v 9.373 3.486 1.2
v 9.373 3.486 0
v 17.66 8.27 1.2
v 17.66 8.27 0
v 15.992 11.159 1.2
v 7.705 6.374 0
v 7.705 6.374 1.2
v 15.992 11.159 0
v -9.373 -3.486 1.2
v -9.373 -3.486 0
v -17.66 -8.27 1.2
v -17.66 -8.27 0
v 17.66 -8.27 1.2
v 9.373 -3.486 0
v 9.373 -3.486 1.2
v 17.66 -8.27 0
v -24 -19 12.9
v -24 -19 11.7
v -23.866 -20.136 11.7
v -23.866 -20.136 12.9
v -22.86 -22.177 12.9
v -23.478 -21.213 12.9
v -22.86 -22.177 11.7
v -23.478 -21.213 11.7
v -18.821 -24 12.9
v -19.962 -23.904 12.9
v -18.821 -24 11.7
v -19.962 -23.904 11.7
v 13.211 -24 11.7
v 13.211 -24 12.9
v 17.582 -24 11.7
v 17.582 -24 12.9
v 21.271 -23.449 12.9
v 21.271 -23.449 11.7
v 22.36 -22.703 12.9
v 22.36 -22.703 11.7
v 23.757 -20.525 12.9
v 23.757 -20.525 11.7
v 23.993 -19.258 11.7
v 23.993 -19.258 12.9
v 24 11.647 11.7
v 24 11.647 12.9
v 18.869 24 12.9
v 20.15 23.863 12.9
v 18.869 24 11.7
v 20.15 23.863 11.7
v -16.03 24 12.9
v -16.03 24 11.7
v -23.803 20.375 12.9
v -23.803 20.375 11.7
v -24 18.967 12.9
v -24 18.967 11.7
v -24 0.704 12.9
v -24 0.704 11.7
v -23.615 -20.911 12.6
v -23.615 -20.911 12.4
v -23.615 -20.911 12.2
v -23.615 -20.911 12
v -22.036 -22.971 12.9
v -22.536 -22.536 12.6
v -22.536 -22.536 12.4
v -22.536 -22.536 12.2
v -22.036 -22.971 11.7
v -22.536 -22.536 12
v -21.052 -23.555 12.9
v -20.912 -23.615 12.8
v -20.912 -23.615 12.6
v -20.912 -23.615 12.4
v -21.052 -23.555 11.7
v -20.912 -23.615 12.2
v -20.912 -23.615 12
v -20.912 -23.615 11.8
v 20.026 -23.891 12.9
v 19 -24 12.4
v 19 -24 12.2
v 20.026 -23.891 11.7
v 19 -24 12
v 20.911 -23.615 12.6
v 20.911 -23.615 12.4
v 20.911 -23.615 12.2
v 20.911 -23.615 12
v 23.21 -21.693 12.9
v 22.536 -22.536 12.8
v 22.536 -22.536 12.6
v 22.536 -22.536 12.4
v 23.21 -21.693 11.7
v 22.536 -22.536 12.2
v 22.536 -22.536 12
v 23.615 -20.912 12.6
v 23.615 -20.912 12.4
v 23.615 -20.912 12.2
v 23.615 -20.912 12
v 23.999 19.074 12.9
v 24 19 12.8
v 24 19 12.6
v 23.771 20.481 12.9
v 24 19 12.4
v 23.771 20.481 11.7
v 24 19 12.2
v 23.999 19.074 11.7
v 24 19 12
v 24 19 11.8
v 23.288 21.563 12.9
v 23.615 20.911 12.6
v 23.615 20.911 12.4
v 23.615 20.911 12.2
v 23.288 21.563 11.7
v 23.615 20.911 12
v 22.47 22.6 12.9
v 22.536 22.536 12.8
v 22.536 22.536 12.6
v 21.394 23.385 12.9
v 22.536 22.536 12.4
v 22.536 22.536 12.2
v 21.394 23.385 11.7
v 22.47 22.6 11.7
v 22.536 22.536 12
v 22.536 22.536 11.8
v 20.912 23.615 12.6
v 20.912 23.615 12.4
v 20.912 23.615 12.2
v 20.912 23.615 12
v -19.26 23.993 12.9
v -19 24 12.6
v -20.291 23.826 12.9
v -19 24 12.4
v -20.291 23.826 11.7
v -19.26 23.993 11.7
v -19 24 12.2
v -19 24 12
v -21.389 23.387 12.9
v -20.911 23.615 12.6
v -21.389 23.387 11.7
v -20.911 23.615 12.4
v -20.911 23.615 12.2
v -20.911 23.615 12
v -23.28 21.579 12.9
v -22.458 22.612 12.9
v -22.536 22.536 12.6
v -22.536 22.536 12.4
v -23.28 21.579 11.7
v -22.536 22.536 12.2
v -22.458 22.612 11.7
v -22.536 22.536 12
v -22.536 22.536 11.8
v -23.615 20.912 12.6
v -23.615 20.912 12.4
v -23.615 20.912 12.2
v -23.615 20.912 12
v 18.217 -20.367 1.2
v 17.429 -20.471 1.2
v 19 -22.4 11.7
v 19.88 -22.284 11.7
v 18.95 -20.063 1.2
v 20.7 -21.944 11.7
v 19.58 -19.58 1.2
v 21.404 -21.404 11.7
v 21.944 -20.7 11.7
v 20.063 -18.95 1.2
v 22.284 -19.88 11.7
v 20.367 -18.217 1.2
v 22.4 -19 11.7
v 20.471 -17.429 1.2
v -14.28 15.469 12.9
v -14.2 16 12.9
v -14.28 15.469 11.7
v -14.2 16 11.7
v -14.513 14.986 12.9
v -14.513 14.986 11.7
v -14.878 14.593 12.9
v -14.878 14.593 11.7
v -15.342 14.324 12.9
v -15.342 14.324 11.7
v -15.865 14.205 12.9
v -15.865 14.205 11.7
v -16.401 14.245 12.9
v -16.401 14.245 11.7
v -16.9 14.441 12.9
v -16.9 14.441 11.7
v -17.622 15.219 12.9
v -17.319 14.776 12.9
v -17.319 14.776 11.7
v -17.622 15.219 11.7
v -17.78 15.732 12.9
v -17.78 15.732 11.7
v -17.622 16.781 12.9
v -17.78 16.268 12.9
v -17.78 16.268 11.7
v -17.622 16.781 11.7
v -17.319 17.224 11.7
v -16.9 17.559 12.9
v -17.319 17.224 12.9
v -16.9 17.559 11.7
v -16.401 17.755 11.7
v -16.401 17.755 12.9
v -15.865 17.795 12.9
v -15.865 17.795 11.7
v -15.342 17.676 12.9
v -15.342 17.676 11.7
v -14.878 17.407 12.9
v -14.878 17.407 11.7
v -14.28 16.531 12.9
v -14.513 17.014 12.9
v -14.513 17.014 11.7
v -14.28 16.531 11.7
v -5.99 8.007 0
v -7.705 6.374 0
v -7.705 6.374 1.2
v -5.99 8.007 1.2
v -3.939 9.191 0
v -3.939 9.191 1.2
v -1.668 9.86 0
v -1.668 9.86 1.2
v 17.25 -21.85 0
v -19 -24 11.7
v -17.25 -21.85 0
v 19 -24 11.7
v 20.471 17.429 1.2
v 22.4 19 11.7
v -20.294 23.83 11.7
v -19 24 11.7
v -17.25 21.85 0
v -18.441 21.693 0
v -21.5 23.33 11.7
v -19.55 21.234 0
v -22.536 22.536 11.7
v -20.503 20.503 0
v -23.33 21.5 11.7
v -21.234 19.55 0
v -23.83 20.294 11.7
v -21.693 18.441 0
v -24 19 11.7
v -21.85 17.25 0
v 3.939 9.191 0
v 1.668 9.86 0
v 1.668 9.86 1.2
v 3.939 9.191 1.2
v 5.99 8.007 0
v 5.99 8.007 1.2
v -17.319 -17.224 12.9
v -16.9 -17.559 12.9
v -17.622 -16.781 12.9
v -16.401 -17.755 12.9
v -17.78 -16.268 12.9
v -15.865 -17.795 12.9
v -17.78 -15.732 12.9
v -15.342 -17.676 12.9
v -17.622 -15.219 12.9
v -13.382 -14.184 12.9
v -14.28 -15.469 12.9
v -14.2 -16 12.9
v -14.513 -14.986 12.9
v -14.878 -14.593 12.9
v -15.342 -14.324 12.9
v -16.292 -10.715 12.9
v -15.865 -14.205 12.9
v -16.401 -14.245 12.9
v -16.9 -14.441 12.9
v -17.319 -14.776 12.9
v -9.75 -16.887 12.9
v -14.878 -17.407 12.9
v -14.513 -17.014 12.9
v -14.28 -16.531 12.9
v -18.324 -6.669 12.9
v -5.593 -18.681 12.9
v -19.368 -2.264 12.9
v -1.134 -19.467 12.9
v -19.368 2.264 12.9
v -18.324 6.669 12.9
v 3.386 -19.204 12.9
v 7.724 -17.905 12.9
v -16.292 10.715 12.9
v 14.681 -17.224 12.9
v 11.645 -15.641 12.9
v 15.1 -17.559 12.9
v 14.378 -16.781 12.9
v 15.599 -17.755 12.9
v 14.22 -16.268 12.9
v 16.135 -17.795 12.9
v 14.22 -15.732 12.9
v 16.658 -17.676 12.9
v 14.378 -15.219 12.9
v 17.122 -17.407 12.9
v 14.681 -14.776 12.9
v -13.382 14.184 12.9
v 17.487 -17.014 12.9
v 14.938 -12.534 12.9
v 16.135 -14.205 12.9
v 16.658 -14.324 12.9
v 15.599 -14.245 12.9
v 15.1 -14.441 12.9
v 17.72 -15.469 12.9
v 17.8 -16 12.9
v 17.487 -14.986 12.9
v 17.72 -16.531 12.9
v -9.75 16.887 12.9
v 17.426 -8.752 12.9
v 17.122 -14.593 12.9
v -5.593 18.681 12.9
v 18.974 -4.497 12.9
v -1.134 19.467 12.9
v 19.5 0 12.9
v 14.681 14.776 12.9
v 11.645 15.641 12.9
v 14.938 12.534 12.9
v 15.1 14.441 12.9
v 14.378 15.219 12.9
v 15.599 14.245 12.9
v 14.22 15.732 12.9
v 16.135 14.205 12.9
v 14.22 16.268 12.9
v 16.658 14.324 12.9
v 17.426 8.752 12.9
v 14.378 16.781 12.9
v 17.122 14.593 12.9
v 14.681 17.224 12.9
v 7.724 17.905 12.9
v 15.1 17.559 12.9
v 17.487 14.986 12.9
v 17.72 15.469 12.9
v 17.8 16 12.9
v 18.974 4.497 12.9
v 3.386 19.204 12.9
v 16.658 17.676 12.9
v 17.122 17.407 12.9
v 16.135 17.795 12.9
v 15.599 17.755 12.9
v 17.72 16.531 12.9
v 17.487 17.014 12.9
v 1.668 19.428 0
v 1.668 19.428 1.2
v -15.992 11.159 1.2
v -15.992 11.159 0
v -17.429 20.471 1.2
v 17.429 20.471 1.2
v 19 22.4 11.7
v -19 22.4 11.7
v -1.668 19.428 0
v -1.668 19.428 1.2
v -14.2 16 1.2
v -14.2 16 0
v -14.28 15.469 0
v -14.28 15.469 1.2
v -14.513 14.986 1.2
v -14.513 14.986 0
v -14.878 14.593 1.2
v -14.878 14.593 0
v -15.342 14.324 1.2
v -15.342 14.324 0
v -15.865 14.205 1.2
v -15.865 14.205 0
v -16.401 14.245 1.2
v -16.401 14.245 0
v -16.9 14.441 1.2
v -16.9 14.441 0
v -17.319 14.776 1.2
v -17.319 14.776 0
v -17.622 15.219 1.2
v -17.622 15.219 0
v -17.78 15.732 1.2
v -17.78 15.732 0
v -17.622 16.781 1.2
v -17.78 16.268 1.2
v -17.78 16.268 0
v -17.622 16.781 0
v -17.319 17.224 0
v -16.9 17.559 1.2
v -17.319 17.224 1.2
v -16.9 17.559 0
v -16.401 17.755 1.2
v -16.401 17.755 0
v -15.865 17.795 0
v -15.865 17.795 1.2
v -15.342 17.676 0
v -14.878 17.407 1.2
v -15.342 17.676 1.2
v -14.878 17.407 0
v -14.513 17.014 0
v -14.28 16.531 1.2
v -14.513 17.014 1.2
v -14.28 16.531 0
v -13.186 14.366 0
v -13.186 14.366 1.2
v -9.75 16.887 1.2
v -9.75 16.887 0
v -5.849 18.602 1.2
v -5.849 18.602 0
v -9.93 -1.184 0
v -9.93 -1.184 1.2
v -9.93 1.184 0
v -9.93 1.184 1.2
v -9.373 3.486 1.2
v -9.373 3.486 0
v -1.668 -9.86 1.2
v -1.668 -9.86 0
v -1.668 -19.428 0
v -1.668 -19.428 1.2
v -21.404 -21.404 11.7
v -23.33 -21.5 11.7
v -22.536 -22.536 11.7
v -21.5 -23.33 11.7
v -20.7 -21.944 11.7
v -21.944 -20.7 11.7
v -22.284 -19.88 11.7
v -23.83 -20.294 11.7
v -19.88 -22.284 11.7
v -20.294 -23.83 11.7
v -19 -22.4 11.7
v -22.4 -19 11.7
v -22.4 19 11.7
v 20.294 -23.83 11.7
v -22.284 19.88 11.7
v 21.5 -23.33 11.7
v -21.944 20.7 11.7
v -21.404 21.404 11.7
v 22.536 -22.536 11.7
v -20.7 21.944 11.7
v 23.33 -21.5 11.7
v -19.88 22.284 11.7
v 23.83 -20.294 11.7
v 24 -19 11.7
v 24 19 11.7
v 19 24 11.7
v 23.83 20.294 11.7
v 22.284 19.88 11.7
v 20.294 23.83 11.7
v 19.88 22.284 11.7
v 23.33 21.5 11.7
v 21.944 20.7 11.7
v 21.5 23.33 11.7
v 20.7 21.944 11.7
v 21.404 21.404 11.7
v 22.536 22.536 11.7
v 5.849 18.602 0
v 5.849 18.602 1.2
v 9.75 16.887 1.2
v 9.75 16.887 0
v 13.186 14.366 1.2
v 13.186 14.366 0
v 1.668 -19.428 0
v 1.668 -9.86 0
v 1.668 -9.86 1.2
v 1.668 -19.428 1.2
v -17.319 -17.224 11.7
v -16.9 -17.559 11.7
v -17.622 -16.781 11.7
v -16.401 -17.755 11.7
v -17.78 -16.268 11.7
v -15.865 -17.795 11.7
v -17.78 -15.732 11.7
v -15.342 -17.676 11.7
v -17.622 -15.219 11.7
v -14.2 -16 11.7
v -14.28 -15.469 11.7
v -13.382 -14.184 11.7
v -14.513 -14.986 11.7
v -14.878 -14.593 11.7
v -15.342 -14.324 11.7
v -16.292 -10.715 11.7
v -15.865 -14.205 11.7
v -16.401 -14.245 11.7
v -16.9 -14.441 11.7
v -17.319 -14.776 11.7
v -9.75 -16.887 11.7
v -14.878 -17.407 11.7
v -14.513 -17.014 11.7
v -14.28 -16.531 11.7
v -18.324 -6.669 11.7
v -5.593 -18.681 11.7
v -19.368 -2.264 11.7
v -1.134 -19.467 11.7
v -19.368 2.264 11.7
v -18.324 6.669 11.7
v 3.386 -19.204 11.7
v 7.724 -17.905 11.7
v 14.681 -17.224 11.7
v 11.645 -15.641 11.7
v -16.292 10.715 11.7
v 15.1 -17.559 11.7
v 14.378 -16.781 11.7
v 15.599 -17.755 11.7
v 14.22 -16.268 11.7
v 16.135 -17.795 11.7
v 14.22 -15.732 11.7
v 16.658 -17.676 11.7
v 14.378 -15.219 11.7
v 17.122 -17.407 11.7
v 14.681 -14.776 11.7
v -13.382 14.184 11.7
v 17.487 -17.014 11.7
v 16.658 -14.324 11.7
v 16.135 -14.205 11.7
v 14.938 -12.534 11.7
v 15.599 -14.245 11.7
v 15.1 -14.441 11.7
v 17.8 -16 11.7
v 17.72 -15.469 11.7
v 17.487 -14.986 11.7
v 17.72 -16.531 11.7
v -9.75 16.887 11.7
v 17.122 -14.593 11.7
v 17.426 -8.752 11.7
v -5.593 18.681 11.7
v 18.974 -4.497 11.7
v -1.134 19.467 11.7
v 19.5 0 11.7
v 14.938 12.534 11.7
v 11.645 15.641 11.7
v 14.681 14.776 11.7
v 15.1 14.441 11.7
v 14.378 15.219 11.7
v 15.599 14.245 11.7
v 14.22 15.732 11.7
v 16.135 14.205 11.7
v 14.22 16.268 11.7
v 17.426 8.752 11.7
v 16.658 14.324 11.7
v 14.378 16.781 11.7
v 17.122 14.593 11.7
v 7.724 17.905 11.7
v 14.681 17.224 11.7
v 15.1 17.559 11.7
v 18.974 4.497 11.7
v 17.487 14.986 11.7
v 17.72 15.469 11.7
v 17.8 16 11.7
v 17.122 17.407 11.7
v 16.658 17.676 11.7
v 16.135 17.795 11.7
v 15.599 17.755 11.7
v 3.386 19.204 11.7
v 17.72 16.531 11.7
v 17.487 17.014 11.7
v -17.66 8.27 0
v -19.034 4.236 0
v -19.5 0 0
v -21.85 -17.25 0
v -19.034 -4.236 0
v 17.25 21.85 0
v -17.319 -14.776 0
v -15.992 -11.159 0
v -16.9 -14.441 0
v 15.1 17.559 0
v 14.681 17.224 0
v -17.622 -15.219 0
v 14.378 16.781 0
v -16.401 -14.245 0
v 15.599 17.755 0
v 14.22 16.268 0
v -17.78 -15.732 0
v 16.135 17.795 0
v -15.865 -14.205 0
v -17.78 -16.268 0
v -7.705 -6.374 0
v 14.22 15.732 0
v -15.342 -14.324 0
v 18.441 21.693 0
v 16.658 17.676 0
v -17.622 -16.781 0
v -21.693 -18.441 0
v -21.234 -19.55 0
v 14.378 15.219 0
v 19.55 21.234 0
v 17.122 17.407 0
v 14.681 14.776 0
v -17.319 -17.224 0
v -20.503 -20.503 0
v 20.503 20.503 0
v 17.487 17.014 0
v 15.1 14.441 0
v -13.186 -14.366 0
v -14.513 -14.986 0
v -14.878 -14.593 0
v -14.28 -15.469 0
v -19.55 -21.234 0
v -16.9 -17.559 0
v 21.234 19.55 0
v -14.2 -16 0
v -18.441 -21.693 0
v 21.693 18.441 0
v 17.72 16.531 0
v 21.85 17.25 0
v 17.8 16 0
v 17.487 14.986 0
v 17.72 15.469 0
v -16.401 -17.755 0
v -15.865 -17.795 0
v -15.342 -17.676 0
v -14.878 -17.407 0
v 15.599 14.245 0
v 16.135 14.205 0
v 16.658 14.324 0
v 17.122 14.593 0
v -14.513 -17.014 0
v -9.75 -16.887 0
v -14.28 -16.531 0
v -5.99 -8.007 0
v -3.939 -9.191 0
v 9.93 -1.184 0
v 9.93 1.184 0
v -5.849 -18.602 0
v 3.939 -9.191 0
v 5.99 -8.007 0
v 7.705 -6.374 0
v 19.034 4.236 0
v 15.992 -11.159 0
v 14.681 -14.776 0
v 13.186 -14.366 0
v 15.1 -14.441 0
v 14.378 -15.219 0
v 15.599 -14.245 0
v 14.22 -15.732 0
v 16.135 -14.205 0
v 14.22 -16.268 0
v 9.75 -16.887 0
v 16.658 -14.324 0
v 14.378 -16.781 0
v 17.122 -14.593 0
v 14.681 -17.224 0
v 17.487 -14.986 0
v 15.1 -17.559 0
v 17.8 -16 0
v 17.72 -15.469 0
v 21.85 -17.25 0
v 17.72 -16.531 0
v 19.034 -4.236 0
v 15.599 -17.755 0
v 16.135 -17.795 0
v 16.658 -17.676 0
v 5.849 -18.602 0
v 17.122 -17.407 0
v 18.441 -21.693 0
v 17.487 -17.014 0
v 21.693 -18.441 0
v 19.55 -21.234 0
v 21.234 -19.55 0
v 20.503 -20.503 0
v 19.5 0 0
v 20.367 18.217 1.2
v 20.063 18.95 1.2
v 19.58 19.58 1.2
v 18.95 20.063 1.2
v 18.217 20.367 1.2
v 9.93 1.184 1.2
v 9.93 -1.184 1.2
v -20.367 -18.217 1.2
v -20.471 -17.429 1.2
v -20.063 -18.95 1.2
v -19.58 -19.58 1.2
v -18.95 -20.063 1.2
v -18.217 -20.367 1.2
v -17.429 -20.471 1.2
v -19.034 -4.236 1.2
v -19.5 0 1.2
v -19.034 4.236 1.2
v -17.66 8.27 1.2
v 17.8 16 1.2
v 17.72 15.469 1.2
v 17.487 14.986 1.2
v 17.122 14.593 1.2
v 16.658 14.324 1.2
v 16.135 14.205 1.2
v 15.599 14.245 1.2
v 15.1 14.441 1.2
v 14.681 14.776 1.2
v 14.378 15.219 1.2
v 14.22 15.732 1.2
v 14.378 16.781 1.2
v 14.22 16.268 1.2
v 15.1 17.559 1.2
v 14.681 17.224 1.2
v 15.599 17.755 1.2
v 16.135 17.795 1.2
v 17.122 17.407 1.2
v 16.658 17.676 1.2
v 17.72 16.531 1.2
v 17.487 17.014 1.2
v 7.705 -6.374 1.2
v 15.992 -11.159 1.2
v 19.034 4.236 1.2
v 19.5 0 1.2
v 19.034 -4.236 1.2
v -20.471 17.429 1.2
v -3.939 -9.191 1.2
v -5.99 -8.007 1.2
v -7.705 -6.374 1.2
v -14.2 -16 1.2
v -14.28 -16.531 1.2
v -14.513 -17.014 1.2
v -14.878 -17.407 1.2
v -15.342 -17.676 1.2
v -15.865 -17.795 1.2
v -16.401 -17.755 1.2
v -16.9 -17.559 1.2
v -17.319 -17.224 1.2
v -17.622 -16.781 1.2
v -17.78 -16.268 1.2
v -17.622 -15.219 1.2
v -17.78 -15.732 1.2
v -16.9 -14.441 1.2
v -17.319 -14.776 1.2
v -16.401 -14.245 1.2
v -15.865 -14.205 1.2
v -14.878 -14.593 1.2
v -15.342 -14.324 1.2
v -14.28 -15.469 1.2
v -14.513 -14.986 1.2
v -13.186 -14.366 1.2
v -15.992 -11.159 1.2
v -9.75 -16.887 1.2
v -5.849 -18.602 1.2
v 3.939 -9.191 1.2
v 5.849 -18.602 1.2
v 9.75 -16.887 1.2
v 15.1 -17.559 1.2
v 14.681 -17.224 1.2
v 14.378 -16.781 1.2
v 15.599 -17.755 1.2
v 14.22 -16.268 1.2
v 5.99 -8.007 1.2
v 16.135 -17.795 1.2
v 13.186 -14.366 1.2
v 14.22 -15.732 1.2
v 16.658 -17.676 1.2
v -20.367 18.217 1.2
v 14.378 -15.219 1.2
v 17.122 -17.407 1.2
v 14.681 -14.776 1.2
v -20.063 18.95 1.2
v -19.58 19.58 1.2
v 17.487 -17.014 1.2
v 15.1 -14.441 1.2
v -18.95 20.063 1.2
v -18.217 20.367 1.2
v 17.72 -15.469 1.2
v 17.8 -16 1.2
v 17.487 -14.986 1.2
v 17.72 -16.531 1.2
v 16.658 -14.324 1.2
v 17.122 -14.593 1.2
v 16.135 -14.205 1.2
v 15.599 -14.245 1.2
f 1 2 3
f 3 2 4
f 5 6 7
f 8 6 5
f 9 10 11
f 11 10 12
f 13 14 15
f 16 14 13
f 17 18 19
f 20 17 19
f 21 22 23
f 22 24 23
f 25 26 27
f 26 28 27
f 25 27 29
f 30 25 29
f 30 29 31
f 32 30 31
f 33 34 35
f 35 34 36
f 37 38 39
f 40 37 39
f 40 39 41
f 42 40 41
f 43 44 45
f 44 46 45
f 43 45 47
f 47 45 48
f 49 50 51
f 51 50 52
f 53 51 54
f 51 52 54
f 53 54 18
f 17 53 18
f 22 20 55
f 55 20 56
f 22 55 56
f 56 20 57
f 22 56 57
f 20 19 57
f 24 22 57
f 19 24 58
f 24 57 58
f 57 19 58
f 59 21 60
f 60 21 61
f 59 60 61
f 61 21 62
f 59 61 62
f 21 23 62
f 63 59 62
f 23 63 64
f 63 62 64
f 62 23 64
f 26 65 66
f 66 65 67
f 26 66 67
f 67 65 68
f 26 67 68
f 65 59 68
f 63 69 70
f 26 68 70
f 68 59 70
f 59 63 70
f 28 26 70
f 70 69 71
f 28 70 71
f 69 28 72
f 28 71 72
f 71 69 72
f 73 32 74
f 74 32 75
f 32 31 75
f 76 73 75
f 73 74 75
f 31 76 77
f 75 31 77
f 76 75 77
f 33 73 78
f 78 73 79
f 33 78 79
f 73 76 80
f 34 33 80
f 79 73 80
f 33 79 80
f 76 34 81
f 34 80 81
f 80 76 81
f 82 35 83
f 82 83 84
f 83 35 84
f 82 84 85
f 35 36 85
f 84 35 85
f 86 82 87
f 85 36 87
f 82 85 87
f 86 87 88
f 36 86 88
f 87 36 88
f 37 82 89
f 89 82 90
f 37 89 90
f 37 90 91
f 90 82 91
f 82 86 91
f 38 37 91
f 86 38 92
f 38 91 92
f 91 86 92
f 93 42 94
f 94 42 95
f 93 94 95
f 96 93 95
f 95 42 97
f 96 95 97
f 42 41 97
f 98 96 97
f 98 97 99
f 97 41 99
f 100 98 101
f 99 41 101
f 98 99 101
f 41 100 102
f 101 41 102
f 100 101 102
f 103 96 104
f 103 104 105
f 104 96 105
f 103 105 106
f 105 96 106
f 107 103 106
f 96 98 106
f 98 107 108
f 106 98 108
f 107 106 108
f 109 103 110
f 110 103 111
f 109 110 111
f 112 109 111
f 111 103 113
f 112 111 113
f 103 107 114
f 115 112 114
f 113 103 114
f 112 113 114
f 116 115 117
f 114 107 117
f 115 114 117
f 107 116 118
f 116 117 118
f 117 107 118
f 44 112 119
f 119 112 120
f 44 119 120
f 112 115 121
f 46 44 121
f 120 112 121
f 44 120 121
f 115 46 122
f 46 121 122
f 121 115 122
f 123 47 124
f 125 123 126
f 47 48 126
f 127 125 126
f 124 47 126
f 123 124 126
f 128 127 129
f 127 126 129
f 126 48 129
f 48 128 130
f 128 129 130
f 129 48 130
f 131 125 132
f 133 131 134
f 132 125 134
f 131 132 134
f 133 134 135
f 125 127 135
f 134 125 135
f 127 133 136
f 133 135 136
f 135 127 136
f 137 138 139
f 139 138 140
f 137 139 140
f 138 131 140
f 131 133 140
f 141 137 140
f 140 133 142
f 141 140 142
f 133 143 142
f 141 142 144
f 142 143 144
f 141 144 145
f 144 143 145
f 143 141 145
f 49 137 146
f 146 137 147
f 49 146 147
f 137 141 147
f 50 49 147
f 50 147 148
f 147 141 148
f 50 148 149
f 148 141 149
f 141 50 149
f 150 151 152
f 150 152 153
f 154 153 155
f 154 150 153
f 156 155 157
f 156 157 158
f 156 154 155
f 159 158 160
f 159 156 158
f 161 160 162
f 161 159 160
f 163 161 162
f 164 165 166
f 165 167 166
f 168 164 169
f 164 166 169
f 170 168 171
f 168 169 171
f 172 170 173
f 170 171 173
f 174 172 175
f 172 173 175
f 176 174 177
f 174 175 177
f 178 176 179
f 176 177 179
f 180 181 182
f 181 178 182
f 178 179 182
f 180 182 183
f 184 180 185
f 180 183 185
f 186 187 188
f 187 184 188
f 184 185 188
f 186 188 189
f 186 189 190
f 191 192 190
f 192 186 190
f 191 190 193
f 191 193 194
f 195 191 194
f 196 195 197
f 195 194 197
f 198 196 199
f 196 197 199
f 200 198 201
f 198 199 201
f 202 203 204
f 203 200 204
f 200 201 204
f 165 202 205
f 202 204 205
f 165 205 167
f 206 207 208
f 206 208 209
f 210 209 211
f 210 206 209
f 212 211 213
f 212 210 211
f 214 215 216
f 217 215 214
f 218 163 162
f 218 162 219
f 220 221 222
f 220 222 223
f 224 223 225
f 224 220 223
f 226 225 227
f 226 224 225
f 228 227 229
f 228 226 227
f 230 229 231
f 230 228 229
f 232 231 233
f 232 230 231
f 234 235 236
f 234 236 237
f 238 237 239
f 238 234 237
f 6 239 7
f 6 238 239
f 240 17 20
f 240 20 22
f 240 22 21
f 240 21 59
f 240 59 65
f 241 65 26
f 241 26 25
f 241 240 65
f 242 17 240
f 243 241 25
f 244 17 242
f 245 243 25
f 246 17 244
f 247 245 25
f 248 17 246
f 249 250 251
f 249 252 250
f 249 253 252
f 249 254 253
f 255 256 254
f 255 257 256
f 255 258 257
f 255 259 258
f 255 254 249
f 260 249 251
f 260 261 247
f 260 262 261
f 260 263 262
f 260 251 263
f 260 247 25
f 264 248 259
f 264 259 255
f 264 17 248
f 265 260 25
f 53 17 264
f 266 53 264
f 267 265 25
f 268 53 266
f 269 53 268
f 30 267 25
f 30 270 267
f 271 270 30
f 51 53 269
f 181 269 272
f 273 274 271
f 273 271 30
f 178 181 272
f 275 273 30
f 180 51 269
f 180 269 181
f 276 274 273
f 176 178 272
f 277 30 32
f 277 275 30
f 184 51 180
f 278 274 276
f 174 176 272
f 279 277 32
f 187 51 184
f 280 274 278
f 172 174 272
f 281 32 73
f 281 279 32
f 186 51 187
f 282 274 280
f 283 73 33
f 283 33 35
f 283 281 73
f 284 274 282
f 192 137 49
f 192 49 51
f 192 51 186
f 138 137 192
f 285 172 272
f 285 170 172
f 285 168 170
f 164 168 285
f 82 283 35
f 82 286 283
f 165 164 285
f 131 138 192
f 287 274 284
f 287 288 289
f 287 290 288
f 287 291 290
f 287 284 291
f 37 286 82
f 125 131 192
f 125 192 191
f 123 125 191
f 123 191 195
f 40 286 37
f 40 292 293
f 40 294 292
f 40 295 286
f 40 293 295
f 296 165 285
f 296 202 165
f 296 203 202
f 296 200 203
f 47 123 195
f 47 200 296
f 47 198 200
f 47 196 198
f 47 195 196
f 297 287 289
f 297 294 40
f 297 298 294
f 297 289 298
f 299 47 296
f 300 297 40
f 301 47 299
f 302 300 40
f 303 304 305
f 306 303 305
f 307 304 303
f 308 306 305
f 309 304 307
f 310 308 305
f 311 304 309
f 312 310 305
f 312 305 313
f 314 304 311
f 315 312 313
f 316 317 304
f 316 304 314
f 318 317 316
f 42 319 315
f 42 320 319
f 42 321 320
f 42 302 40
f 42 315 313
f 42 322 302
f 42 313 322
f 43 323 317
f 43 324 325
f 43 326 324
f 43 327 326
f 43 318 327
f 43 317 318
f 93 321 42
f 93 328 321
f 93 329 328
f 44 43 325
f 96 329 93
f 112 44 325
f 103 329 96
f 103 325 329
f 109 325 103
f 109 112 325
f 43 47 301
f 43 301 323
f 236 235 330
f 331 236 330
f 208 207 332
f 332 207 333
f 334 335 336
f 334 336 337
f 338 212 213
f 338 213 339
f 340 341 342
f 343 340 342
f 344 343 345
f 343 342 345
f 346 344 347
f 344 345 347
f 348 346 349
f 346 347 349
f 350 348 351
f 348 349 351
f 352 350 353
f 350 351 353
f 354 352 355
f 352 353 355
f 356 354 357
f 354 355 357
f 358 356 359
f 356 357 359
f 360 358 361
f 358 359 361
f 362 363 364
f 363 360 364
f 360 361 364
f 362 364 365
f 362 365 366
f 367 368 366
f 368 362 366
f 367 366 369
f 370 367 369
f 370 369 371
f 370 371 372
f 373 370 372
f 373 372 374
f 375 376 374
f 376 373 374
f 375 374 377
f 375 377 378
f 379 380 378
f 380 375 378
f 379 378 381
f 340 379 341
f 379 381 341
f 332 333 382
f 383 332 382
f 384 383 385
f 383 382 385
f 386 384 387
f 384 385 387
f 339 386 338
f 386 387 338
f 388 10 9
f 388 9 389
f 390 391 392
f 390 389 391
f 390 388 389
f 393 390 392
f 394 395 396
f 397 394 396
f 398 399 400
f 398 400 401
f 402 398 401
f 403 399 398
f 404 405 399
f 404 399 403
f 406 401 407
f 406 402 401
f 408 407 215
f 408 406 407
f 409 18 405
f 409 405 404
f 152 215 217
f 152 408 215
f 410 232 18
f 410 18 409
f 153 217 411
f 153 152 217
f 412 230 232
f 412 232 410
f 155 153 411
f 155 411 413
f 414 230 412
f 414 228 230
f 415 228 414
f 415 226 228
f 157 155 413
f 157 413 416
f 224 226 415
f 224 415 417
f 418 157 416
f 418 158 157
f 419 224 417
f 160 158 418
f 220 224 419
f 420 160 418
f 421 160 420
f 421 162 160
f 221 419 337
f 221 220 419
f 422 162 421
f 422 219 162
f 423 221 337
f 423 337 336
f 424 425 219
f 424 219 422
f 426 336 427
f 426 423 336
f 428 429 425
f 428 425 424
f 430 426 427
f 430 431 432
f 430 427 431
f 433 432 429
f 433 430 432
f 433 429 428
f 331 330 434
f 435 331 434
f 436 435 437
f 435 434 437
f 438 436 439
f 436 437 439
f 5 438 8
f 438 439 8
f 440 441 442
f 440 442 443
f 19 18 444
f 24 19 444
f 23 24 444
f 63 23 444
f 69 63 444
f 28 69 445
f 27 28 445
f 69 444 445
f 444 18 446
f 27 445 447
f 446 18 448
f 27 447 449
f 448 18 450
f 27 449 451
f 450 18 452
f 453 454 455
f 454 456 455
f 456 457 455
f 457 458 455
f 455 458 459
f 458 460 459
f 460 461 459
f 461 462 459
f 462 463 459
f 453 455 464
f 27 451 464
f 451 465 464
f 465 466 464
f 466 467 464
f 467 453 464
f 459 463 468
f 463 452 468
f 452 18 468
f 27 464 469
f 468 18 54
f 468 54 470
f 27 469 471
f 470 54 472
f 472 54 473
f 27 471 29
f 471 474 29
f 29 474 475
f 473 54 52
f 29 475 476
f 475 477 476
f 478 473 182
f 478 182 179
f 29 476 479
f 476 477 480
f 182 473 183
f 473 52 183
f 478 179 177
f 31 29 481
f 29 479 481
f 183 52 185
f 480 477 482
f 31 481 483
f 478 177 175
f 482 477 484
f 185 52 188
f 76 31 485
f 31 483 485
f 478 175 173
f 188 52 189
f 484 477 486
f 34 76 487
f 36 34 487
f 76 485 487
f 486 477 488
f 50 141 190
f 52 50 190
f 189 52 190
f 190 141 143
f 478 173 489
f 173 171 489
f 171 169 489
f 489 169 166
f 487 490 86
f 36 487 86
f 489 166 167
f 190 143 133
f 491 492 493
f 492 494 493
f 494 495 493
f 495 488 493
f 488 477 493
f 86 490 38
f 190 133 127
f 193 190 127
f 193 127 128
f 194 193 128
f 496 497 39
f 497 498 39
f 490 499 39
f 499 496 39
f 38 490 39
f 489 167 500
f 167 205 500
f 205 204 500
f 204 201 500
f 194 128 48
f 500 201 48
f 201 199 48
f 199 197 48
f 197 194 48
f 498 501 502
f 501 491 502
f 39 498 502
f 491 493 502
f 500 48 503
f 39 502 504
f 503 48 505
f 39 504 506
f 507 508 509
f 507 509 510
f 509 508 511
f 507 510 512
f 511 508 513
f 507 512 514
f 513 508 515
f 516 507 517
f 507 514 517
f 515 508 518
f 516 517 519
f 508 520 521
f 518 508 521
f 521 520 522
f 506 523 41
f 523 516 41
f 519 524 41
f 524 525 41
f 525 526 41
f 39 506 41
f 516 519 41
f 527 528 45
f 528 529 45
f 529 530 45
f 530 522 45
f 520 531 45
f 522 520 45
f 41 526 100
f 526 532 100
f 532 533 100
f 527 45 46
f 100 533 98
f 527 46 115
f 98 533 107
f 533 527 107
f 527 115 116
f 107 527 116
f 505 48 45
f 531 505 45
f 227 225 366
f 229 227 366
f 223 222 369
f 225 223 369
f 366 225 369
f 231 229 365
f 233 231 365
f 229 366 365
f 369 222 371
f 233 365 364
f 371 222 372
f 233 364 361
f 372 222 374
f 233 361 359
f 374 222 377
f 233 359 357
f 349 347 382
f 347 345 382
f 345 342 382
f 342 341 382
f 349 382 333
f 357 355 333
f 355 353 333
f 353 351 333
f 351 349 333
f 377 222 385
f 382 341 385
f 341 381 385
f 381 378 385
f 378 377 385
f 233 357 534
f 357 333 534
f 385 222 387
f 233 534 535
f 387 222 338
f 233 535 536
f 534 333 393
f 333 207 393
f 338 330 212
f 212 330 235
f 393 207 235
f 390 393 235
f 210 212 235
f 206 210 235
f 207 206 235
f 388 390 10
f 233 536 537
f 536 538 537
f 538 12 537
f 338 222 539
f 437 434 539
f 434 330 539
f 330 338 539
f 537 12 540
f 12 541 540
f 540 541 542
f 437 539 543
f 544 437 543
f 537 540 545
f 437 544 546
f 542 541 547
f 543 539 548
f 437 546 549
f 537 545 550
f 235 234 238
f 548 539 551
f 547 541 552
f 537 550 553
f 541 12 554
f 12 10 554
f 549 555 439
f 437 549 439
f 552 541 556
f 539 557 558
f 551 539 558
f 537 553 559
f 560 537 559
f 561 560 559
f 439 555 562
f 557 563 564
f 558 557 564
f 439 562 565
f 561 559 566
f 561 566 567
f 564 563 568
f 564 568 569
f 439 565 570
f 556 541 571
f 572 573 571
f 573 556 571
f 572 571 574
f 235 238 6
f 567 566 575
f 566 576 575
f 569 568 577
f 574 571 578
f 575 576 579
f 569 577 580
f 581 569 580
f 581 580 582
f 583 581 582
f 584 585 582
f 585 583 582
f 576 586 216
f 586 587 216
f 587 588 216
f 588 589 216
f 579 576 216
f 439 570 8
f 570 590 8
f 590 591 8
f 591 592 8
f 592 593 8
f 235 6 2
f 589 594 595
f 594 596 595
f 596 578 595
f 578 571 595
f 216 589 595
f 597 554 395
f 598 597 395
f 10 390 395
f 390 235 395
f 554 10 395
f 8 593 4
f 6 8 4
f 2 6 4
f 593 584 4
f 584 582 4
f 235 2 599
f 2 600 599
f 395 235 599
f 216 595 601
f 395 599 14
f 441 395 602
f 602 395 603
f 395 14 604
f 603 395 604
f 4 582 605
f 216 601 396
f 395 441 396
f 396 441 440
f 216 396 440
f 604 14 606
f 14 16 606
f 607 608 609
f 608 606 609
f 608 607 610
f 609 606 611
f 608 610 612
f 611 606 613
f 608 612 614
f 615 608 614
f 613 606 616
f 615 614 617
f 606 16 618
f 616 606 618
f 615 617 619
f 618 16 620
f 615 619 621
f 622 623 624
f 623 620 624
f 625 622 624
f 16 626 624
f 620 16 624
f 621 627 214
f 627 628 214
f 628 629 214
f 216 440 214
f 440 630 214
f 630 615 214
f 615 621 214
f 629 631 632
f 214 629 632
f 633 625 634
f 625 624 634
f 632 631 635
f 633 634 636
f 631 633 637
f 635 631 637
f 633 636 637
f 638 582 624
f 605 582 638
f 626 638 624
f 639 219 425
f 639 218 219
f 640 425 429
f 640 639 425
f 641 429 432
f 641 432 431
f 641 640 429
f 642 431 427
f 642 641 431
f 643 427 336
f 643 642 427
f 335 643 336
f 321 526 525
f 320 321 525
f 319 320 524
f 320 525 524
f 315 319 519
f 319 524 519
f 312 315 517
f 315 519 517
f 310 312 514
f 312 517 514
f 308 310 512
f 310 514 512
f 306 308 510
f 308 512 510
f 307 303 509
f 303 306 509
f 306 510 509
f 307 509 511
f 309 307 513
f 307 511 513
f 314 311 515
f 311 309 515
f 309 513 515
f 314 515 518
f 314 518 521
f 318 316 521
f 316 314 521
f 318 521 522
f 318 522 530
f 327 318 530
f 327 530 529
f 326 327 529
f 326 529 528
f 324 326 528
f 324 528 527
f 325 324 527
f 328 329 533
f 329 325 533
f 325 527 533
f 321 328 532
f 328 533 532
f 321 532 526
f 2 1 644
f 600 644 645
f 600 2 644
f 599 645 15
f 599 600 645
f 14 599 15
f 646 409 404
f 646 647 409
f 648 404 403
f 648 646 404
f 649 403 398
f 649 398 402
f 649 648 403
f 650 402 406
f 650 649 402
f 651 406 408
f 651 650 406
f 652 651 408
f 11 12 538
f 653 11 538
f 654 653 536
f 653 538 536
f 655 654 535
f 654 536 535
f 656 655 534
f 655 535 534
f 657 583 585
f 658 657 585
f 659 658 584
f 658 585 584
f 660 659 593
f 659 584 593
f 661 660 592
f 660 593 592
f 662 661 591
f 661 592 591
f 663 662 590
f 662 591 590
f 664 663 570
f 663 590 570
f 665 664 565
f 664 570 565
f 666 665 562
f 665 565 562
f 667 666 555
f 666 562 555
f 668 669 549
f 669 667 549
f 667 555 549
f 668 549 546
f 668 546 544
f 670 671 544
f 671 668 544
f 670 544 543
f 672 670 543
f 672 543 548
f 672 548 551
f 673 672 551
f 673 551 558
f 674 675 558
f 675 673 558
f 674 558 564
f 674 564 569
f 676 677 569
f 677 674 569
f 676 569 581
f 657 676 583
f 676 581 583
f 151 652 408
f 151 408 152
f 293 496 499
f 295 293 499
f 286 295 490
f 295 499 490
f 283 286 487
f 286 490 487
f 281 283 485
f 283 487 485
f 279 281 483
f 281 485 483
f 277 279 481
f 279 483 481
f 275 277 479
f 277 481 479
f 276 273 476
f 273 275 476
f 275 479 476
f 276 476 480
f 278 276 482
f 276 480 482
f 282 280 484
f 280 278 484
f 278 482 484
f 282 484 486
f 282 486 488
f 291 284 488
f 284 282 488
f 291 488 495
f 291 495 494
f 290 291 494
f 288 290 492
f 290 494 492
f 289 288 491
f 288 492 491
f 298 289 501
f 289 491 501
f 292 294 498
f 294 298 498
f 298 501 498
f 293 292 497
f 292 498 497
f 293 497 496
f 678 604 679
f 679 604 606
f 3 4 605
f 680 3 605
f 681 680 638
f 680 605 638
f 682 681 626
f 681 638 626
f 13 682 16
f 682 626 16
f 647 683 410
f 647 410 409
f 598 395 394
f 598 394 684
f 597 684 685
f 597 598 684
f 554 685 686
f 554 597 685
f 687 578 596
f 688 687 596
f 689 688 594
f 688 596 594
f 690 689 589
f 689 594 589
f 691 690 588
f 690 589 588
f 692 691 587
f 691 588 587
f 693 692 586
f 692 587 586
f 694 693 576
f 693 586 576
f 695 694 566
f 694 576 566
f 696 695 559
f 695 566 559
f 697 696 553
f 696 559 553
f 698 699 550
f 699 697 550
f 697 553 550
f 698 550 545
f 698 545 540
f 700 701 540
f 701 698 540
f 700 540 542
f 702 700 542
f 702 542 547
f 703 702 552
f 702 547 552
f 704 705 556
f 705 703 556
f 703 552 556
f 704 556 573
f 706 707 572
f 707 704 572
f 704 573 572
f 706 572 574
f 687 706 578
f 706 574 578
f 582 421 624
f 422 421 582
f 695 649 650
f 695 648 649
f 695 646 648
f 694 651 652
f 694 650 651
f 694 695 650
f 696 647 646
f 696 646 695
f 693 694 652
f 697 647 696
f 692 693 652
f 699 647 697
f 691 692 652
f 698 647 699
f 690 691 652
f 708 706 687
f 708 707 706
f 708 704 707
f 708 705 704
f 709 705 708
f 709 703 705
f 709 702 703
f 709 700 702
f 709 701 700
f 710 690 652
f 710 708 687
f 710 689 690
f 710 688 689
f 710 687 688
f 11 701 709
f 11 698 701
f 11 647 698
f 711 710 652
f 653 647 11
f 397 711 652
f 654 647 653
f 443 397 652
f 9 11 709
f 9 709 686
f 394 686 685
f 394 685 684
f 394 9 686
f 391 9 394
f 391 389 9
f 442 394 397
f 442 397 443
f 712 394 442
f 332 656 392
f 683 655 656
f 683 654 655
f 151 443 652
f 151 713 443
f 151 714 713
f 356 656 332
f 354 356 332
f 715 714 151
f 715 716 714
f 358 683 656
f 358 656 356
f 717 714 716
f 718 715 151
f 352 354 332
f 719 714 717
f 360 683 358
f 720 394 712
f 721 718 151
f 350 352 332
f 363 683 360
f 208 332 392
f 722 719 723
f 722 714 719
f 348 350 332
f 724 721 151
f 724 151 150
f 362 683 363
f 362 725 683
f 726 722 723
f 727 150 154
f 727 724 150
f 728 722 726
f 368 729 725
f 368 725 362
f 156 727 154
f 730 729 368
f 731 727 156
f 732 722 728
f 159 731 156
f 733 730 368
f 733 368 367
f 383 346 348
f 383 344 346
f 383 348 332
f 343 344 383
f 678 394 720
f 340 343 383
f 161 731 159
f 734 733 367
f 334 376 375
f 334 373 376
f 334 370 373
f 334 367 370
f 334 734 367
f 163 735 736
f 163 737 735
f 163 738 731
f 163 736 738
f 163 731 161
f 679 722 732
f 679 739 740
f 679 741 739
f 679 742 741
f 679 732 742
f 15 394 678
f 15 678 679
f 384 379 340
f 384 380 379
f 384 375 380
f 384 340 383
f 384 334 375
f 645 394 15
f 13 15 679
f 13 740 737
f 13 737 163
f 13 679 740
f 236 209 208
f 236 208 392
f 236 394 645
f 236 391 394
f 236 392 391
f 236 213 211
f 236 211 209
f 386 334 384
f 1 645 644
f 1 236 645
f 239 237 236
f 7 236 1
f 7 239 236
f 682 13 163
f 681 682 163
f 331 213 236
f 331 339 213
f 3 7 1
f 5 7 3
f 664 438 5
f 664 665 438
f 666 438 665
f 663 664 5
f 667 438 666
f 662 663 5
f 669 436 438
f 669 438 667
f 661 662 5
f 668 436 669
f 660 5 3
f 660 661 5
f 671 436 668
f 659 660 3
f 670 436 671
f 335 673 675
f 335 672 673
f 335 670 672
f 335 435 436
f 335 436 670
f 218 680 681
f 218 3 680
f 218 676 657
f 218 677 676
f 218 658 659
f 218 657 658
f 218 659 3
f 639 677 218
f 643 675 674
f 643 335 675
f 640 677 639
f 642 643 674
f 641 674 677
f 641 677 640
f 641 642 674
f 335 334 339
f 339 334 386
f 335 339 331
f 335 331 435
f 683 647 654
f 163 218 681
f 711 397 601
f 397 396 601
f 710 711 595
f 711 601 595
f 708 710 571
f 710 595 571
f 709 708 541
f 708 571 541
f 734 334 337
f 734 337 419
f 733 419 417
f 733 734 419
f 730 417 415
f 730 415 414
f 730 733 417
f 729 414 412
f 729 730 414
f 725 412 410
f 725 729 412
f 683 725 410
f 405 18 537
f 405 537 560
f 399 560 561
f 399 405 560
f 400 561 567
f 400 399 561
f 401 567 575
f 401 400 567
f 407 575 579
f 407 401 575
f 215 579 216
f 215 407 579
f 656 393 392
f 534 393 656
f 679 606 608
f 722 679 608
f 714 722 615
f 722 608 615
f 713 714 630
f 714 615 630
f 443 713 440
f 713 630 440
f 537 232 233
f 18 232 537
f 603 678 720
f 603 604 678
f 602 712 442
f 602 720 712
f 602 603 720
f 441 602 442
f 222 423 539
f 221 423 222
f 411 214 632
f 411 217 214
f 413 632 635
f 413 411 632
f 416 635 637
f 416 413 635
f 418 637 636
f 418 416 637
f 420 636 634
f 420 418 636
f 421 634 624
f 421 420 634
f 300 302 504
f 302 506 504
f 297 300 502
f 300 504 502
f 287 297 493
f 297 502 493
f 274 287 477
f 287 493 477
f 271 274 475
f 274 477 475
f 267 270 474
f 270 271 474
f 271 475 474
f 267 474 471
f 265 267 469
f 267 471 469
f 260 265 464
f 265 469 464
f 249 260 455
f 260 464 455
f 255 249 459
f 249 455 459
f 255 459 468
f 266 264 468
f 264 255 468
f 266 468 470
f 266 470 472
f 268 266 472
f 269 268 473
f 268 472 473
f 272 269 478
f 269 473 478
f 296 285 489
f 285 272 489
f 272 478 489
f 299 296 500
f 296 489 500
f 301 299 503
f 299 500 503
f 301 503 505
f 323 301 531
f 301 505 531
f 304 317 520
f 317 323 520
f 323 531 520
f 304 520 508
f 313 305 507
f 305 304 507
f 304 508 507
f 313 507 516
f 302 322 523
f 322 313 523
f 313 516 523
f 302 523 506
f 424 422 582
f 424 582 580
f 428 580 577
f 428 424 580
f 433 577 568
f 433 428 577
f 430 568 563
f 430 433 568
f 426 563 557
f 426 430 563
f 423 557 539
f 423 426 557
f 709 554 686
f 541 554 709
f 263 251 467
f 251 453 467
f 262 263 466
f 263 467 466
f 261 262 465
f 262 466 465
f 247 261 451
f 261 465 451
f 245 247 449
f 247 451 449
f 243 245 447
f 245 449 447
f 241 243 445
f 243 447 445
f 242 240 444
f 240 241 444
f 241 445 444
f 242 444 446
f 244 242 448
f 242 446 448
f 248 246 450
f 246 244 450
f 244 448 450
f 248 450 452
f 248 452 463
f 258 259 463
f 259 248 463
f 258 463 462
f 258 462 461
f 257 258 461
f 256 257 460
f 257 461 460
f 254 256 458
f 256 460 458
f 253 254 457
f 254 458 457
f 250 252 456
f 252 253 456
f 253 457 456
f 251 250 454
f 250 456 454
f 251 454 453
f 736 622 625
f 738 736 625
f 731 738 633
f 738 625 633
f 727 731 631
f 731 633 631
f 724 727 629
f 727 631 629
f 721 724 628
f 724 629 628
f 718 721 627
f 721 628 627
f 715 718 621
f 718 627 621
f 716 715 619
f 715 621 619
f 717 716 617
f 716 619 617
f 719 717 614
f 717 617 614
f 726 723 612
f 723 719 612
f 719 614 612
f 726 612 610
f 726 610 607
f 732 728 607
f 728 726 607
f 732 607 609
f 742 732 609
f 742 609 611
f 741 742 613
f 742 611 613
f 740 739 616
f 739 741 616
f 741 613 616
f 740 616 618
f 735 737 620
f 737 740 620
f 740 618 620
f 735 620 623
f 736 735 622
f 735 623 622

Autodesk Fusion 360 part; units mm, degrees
sketch "Base Master" plane through (0, 0, 0) normal (0, 0, 1) x (1, 0, 0)
  circle A0 centre (0, 0) radius 19.5
  line L0 (16, -16) -> (-16, -16) construction
  line L1 (-16, -16) -> (-16, 16) construction
  line L2 (-16, 16) -> (16, 16) construction
  line L3 (16, 16) -> (16, -16) construction
  line L4 (16, -16) -> (-16, 16) construction
  line L5 (-16, -16) -> (16, 16) construction
  circle A1 centre (-16, 16) radius 1.8
  circle A2 centre (16, 16) radius 1.8
  circle A3 centre (16, -16) radius 1.8
  circle A4 centre (-16, -16) radius 1.8
  line L6 (17.25, -20.25) -> (-17.25, -20.25)
  line L7 (-20.25, -17.25) -> (-20.25, 17.25)
  line L8 (-17.25, 20.25) -> (17.25, 20.25)
  line L9 (20.25, 17.25) -> (20.25, -17.25)
  line L10 (20.25, -20.25) -> (-20.25, 20.25) construction
  line L11 (-20.25, -20.25) -> (20.25, 20.25) construction
  arc A5 (-17.25, 20.25) -> (-20.25, 17.25) centre (-17.25, 17.25) ccw
  arc A6 (20.25, 17.25) -> (17.25, 20.25) centre (17.25, 17.25) ccw
  arc A7 (17.25, -20.25) -> (20.25, -17.25) centre (17.25, -17.25) ccw
  arc A8 (-20.25, -17.25) -> (-17.25, -20.25) centre (-17.25, -17.25) ccw
  line L12 (-21.85, -17.25) -> (-21.85, 17.25)
  arc A9 (-17.25, 21.85) -> (-21.85, 17.25) centre (-17.25, 17.25) ccw
  line L13 (-17.25, 21.85) -> (17.25, 21.85)
  arc A10 (21.85, 17.25) -> (17.25, 21.85) centre (17.25, 17.25) ccw
  line L14 (21.85, 17.25) -> (21.85, -17.25)
  arc A11 (17.25, -21.85) -> (21.85, -17.25) centre (17.25, -17.25) ccw
  line L15 (17.25, -21.85) -> (-17.25, -21.85)
  arc A12 (-21.85, -17.25) -> (-17.25, -21.85) centre (-17.25, -17.25) ccw
  dimension "d10" = 39
  dimension "d11" = 32
  dimension "d12" = 32
  dimension "d13" = 3.6
  dimension "d14" = 3.6
  dimension "d15" = 3.6
  dimension "d16" = 3.6
  dimension "d18" = 40.5
  dimension "d19" = 40.5
  dimension "d20" = 3
  dimension "d21" = 3
  dimension "d22" = 3
  dimension "d23" = 3
sketch "Base Loft" plane through (0, 0, 0) normal (0, 0, 1) x (1, 0, 0)
  arc A0 (21.85, 17.25) -> (17.25, 21.85) centre (17.25, 17.25) ccw
  line L0 (21.85, 17.25) -> (21.85, -17.25)
  arc A1 (17.25, -21.85) -> (21.85, -17.25) centre (17.25, -17.25) ccw
  line L1 (17.25, -21.85) -> (-17.25, -21.85)
  arc A2 (-21.85, -17.25) -> (-17.25, -21.85) centre (-17.25, -17.25) ccw
  line L2 (-21.85, -17.25) -> (-21.85, 17.25)
  arc A3 (-17.25, 21.85) -> (-21.85, 17.25) centre (-17.25, 17.25) ccw
  line L3 (-17.25, 21.85) -> (17.25, 21.85)
  arc A4 (20.25, 17.25) -> (17.25, 20.25) centre (17.25, 17.25) ccw
  line L4 (20.25, 17.25) -> (20.25, -17.25)
  arc A5 (17.25, -20.25) -> (20.25, -17.25) centre (17.25, -17.25) ccw
  line L5 (17.25, -20.25) -> (-17.25, -20.25)
  arc A6 (-20.25, -17.25) -> (-17.25, -20.25) centre (-17.25, -17.25) ccw
  line L6 (-20.25, -17.25) -> (-20.25, 17.25)
  arc A7 (-17.25, 20.25) -> (-20.25, 17.25) centre (-17.25, 17.25) ccw
  line L7 (-17.25, 20.25) -> (17.25, 20.25)
ref_plane "WorkPlane1" through (0, 0, 11.7) normal (0, 0, 1) x (1, 0, 0)
sketch "Top Loft" plane through (0, 0, 11.7) normal (0, 0, 1) x (1, 0, 0)
  line L0 (19, -24) -> (-19, -24)
  line L1 (-24, -19) -> (-24, 19)
  line L2 (-19, 24) -> (19, 24)
  line L3 (24, 19) -> (24, -19)
  line L4 (24, -24) -> (-24, 24) construction
  line L5 (-24, -24) -> (24, 24) construction
  arc A0 (-19, 24) -> (-24, 19) centre (-19, 19) ccw
  arc A1 (24, 19) -> (19, 24) centre (19, 19) ccw
  arc A2 (-24, -19) -> (-19, -24) centre (-19, -19) ccw
  arc A3 (19, -24) -> (24, -19) centre (19, -19) ccw
  line L6 (-19, 22.4) -> (19, 22.4)
  arc A4 (22.4, 19) -> (19, 22.4) centre (19, 19) ccw
  line L7 (22.4, 19) -> (22.4, -19)
  arc A5 (19, -22.4) -> (22.4, -19) centre (19, -19) ccw
  line L8 (19, -22.4) -> (-19, -22.4)
  arc A6 (-22.4, -19) -> (-19, -22.4) centre (-19, -19) ccw
  line L9 (-22.4, -19) -> (-22.4, 19)
  arc A7 (-19, 22.4) -> (-22.4, 19) centre (-19, 19) ccw
  dimension "d27" = 48
  dimension "d28" = 48
  dimension "d29" = 5
  dimension "d30" = 5
  dimension "d31" = 5
  dimension "d32" = 5
  dimension "d33" = 1.6
loft "Loft1" add profiles "Base Loft", "Top Loft" section 1 section 2 contours L0 L1 L2 L3 A0 A1 A2 A3 | L6 A4 L7 A5 L8 A6 L9 A7 makes body 1 in component "Fan Cage"
loft "Loft2" cut profiles "Top Loft", "Base Loft" section 1 contours L6 A4 L7 A5 L8 A6 L9 A7 section 2 contours A4 L4 A5 L5 A6 L6 A7 L7 bodies 1 in component "Fan Cage"
extrude "Extrude1" add sketch "Base Master" along normal blind 1.2 contours L6 L7 L8 L9 A5 A6 A7 A8 | L12 A9 L13 A10 L14 A11 L15 A12 bodies 1 in component "Fan Cage"
sketch "Sketch4" plane through (0, 0, 0) normal (0, 0, 1) x (1, 0, 0)
  circle A0 centre (0, 0) radius 10
  line L0 (0, 0) -> (0, 20) construction
  line L1 (1.6679, 9.8599) -> (1.6679, 19.4285)
  line L2 (-1.6679, 9.8599) -> (-1.6679, 19.4285)
  circle A1 centre (0, 0) radius 19.5
  line L3 (-7.705, 6.3744) -> (-15.9917, 11.1587)
  line L4 (-9.3729, 3.4855) -> (-17.6596, 8.2698)
  line L5 (-9.3729, -3.4855) -> (-17.6596, -8.2698)
  line L6 (-7.705, -6.3744) -> (-15.9917, -11.1587)
  line L7 (-1.6679, -9.8599) -> (-1.6679, -19.4285)
  line L8 (1.6679, -9.8599) -> (1.6679, -19.4285)
  line L9 (7.705, -6.3744) -> (15.9917, -11.1587)
  line L10 (9.3729, -3.4855) -> (17.6596, -8.2698)
  line L11 (9.3729, 3.4855) -> (17.6596, 8.2698)
  line L12 (7.705, 6.3744) -> (15.9917, 11.1587)
  dimension "d38" = 20
  dimension "d41" = 360
extrude "Extrude2" add sketch "Sketch4" along normal up to surface (1.2 mm away) contours A0 | A0 A1 L11 L12 | A0 A1 L9 L10 | A0 L1 L2 A1 | A0 A1 L7 L8 | A0 A1 L3 L4 | A0 A1 L5 L6 bodies 1 in component "Fan Cage"
sketch "Sketch5" plane through (0, 0, 11.7) normal (0, 0, 1) x (1, 0, 0)
  circle A0 centre (-16, 16) radius 1.8
  circle A1 centre (16, 16) radius 1.8
  circle A2 centre (16, -16) radius 1.8
  circle A3 centre (-16, -16) radius 1.8
  spline S0 degree 3 poles (-24, -19) (-24, -20.325) (-23.4473, -21.6414) (-22.5015, -22.5693) (-21.5784, -23.4748) (-20.293, -24) (-19, -24) (-6.4171, -24) (6.4171, -24) (19, -24) (20.325, -24) (21.6414, -23.4473) (22.5693, -22.5015) (23.4748, -21.5784) (24, -20.293) (24, -19) (24, -6.4171) (24, 6.4171) (24, 19) (24, 20.325) (23.4473, 21.6414) (22.5015, 22.5693) (21.5784, 23.4748) (20.293, 24) (19, 24) (6.4171, 24) (-6.4171, 24) (-19, 24) (-20.325, 24) (-21.6414, 23.4473) (-22.5693, 22.5015) (-23.4748, 21.5784) (-24, 20.293) (-24, 19) (-24, 6.4171) (-24, -6.4171) (-24, -19) knots 0 0 0 0 0.021791 0.021791 0.021791 0.043057 0.043057 0.043057 0.25 0.25 0.25 0.271791 0.271791 0.271791 0.293057 0.293057 0.293057 0.5 0.5 0.5 0.521791 0.521791 0.521791 0.543057 0.543057 0.543057 0.75 0.75 0.75 0.771791 0.771791 0.771791 0.793057 0.793057 0.793057 1 1 1 1
  circle A4 centre (0, 0) radius 19.5
extrude "Extrude1'" add sketch "Sketch5" along normal blind 1.2 separate body makes body 2 in component "TPU Gasket"
component "Fan Cage" placed x (1, 0, 0) y (0, 1, 0) z (0, 0, 1) at (0, 0, 0)
component "TPU Gasket" placed x (1, 0, 0) y (0, 1, 0) z (0, 0, 1) at (0, 0, 0)
equation "fan_dia = 40 mm" comment "Diameter of the fan itself"
equation "hole_dia = fan_dia - 1 mm" comment "Actual size of the fan hole"
equation "screw_hole_dia = 3.6 mm" comment "Screw hole size"
equation "screw_hole_spacing = 32 mm" comment "Space between screws"
equation "fillet_fan = 3 mm" comment "Radius of fan edge fillet"
equation "fillet_wide = 5 mm" comment "Radius of large edge fillet"
equation "inside_margin = 1 mm" comment "Space around fan inside cage"
equation "fan_thickness = 10 mm" comment "Thickness of fan"
equation "wide_edge = fan_dia + 8 mm" comment "Distance between widest edges"
equation "d10 = hole_dia"
equation "d11 = screw_hole_spacing"
equation "d12 = screw_hole_spacing"
equation "d13 = screw_hole_dia"
equation "d14 = d13"
equation "d15 = d13"
equation "d16 = d13"
equation "narrow_edge = fan_dia + 0.5 mm" comment "Distance between shortest edges"
equation "d18 = narrow_edge"
equation "d19 = narrow_edge"
equation "d20 = fillet_fan"
equation "d21 = fillet_fan"
equation "d22 = fillet_fan"
equation "d23 = fillet_fan"
equation "wall_thickness = 1.6 mm"
equation "d25 = -wall_thickness"
equation "d26 = fan_thickness + face_thickness + 0.5 mm"
equation "d27 = wide_edge"
equation "d28 = wide_edge"
equation "d29 = fillet_wide"
equation "d30 = fillet_wide"
equation "d31 = fillet_wide"
equation "d32 = fillet_wide"
equation "d33 = wall_thickness"
equation "face_thickness = 1.2 mm" comment "Thickness of fan face"
equation "d35 = face_thickness"
equation "motor_dia = 20 mm" comment "Area in center covered by fan motor"
equation "d38 = motor_dia"
